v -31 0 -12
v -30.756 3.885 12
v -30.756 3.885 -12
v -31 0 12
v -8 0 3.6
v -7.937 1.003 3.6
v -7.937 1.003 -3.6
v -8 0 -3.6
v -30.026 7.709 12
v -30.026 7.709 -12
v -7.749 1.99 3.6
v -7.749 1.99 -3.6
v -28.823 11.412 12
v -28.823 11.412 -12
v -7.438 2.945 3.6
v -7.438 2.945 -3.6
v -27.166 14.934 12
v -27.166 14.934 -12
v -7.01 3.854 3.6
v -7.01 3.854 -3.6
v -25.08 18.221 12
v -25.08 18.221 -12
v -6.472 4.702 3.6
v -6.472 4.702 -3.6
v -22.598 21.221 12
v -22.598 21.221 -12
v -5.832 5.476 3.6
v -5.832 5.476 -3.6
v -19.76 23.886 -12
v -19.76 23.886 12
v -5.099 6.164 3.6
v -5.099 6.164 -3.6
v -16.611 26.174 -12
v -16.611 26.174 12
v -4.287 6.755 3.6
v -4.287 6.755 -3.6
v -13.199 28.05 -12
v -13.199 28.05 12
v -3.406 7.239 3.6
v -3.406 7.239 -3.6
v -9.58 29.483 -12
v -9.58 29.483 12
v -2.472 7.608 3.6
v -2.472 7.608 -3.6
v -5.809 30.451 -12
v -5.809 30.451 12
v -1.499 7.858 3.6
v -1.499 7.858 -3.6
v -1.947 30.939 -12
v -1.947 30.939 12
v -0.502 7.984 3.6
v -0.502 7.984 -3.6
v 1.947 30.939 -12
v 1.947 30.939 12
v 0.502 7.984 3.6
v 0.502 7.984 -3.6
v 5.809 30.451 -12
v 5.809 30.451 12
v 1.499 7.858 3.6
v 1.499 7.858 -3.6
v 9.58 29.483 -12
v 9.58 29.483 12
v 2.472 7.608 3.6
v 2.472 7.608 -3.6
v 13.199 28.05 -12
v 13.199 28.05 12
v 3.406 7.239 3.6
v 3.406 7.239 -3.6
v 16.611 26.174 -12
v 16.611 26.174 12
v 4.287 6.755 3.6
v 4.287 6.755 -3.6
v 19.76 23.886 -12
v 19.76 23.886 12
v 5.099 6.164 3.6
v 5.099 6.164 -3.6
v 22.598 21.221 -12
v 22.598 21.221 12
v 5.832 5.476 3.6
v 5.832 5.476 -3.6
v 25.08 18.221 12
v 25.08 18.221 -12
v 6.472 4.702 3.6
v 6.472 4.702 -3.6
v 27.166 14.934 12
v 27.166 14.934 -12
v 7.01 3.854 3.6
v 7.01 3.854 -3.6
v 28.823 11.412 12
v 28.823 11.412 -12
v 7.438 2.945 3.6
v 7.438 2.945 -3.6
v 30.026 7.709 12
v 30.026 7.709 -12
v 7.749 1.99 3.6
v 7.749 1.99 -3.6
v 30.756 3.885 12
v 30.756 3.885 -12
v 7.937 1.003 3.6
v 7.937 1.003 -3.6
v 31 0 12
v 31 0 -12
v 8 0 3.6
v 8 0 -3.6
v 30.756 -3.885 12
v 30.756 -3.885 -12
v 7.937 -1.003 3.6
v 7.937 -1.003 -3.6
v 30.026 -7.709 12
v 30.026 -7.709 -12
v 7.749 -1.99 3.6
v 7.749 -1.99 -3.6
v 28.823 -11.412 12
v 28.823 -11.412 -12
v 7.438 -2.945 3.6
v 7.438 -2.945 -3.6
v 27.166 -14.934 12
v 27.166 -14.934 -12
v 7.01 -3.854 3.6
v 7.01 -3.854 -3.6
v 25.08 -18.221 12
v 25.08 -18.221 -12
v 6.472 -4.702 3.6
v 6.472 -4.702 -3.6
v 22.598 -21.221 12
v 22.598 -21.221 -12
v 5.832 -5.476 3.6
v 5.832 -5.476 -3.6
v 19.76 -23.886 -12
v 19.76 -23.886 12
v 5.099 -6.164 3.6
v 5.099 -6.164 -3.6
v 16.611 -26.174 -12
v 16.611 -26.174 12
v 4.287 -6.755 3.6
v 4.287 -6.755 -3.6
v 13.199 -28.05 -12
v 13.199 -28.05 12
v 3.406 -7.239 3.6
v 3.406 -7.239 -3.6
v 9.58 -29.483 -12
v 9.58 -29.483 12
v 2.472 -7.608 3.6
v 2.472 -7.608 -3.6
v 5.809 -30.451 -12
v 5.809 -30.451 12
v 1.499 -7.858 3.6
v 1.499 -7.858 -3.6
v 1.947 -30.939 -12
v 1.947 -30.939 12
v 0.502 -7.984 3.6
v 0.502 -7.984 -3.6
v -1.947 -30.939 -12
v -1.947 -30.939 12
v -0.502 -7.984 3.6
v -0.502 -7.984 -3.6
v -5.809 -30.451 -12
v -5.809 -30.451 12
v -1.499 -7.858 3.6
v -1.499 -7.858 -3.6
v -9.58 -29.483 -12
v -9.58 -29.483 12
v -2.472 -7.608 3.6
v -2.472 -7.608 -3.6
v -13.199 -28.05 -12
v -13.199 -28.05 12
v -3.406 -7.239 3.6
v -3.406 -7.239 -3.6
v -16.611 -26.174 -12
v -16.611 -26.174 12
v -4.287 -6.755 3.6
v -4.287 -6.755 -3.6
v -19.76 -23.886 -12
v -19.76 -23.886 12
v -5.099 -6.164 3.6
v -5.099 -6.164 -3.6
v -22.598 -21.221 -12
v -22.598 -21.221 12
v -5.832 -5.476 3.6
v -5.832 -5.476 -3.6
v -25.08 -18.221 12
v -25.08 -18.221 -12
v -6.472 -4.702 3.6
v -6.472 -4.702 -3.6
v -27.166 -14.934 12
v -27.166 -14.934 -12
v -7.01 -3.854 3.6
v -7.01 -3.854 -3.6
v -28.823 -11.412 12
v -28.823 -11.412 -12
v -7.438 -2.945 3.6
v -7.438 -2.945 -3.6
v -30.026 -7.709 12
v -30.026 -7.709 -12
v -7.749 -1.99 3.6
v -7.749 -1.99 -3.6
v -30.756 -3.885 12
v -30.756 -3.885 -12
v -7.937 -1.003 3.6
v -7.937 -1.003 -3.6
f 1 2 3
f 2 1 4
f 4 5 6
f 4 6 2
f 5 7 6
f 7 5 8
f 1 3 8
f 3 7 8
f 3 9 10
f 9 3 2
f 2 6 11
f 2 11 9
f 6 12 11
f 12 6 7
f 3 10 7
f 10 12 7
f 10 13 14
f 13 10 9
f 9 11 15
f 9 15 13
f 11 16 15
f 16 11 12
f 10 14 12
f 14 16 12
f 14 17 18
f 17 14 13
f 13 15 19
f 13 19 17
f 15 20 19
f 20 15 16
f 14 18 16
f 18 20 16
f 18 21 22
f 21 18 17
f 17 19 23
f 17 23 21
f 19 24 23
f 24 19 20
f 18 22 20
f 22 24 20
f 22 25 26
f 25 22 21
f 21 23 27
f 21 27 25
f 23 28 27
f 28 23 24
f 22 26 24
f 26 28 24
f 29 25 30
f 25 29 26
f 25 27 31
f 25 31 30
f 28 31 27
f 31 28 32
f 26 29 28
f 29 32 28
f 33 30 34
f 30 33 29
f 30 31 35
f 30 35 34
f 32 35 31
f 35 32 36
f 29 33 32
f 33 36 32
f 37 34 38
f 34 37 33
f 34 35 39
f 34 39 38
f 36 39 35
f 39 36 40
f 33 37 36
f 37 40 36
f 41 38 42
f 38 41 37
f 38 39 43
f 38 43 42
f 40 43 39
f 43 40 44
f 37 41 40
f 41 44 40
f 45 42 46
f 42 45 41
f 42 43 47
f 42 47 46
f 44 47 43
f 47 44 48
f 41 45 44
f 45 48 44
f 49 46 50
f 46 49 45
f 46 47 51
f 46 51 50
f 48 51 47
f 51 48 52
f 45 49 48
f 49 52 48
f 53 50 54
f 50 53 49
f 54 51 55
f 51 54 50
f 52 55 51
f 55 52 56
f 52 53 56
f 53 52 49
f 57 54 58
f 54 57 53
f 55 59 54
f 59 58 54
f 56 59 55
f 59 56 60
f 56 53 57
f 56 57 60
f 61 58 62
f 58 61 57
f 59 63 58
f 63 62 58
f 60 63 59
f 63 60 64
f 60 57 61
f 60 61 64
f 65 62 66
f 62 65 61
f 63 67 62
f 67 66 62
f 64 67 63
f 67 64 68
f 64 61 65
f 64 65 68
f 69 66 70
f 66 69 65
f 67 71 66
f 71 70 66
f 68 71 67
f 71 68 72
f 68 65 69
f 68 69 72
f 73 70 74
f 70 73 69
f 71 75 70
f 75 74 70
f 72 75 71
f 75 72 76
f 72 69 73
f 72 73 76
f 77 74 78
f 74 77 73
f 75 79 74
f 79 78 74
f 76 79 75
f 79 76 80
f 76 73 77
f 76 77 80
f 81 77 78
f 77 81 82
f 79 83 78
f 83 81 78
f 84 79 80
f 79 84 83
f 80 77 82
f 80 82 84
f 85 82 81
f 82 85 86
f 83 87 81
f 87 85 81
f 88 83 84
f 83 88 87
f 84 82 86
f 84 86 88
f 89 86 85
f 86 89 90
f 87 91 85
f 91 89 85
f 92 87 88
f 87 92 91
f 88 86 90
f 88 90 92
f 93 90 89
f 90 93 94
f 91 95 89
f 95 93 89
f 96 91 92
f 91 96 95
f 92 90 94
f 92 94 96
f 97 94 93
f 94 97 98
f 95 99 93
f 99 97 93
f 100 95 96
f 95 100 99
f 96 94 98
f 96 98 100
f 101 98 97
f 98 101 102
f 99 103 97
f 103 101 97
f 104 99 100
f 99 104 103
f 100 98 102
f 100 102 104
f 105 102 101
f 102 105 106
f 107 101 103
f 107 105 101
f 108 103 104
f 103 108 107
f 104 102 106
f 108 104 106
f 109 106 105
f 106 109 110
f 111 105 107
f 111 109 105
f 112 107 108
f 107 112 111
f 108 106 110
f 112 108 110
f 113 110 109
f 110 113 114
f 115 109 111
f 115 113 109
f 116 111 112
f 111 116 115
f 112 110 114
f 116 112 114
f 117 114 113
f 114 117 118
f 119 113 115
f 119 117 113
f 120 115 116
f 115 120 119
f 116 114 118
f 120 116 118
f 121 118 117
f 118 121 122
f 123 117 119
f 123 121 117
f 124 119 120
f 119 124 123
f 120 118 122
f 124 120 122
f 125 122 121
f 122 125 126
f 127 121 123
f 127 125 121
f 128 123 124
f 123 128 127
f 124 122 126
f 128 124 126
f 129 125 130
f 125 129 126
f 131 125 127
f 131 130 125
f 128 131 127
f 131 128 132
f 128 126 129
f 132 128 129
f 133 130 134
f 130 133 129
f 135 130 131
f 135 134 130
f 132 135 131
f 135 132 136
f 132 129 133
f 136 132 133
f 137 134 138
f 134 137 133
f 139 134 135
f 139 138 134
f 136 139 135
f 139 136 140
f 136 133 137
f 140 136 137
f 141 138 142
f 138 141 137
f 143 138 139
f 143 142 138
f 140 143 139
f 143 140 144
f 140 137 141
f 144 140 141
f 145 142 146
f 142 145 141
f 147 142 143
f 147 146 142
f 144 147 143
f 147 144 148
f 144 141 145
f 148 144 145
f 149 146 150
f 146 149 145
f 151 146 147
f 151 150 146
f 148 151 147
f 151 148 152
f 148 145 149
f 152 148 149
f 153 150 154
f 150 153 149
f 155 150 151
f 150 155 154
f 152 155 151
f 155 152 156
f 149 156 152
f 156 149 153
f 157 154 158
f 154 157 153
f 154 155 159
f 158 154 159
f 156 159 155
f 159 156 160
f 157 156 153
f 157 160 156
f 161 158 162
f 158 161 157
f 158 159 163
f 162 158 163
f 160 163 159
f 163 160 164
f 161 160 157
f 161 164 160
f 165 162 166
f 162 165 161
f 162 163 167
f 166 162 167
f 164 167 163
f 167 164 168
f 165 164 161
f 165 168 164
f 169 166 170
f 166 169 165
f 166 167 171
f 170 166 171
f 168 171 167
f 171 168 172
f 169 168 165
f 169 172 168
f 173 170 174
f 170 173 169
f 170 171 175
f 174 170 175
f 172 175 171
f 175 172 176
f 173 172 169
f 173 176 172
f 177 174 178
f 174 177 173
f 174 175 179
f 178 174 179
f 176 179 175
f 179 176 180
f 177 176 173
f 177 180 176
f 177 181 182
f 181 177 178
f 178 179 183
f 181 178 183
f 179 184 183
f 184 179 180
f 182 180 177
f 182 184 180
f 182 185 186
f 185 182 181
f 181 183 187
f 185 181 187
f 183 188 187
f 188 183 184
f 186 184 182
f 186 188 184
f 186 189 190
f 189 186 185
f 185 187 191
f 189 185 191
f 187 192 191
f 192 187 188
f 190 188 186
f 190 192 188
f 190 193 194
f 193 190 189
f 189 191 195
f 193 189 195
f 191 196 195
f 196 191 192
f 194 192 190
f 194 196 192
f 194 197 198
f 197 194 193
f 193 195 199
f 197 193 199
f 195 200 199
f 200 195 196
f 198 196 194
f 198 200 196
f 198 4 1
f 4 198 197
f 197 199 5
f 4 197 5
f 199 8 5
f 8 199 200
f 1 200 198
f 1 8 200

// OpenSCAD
$fn = 50;

difference() {
	union() {
		rotate_extrude(angle = 360) {
			translate(v = [8, 0, 0]) {
				rotate(a = [0, 0, -90]) {
					polygon(points = [[3.6, 0], [12, 23], [-12, 23], [-3.6, 0]]);
				}
			}
		}
	}
	union();
}
